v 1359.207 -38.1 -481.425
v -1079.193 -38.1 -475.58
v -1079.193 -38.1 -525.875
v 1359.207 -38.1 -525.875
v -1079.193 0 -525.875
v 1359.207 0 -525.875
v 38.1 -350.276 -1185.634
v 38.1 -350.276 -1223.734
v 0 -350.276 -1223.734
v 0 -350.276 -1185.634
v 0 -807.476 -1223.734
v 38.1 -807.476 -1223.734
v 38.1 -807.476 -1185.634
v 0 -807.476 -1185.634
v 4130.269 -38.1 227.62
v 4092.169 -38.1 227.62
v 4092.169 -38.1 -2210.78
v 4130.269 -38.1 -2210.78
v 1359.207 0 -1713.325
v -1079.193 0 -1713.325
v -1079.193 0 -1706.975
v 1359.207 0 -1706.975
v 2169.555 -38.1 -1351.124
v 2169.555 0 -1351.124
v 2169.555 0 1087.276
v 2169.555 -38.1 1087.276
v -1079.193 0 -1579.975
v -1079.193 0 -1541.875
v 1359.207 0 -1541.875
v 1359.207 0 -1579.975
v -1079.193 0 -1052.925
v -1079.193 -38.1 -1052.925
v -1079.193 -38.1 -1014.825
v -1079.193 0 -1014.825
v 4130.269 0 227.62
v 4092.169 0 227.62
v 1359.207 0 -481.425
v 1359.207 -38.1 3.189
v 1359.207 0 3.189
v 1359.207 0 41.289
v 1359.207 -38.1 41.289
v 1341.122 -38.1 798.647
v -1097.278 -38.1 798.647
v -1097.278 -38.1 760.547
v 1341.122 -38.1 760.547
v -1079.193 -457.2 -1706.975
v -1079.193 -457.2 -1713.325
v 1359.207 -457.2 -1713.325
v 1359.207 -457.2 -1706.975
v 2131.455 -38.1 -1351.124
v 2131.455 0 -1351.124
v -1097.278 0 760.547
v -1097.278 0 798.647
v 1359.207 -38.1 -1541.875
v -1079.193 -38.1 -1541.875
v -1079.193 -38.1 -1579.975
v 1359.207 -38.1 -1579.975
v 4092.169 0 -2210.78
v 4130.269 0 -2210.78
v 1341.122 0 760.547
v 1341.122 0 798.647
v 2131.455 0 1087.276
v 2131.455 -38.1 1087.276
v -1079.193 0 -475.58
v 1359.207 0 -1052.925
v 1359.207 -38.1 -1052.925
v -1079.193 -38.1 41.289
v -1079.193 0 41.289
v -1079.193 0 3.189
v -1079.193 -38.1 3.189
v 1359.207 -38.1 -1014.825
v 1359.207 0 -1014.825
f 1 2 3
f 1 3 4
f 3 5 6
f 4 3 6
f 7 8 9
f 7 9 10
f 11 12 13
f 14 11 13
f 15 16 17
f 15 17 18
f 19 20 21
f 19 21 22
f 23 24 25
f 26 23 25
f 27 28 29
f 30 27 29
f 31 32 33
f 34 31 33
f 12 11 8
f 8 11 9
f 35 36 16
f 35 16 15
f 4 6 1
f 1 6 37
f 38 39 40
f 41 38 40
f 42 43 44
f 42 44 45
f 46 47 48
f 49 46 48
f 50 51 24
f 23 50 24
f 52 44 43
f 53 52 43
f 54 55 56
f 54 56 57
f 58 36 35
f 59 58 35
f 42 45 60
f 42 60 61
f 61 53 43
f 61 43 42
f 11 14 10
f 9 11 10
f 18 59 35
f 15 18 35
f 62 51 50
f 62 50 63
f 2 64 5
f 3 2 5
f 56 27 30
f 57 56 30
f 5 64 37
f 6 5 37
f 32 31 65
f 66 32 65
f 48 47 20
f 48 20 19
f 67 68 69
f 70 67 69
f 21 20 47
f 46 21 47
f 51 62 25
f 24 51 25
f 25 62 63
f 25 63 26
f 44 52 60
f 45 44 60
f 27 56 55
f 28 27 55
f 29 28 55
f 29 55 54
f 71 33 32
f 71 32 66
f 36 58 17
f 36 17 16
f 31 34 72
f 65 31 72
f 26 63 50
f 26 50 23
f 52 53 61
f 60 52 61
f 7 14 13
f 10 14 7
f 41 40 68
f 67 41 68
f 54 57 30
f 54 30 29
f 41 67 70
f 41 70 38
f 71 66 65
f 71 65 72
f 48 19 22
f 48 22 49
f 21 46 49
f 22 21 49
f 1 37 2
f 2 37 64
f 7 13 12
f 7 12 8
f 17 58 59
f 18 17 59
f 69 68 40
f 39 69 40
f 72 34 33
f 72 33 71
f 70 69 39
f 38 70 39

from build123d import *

# Parameters (mm, degrees)
F0_W      = 2438.4
F0_H      = 38.1
F1_DEPTH  = 38.1
F0_W_2    = 38.1
F0_H_2    = 2438.4
F2_DEPTH  = 38.1
F3_DEPTH  = 38.1
F4_DEPTH  = 38.1
F5_DEPTH  = 38.1
F6_DEPTH  = 38.1
F7_E6_W   = 2438.4
F7_E6_H   = 457.2
F8_DEPTH  = 6.35
F9_DEPTH  = 38.1
F10_W     = 457.2
F10_H     = 38.1
F11_DEPTH = 38.1


with BuildPart() as f1:
    # F0 (on Front) → F1 (new body)
    with BuildSketch(Plane.XZ):
        with Locations((121.9220010757, 779.5966842651)):
            Rectangle(F0_W, F0_H)
    extrude(amount=F1_DEPTH)


with BuildPart() as f2:
    # F0 (on Front) → F2 (new body)
    with BuildSketch(Plane.XZ):
        with Locations((2150.5049446106, -131.9238098145)):
            Rectangle(F0_W_2, F0_H_2)
    extrude(amount=F2_DEPTH)


with BuildPart() as f3:
    # F0 (on Front) → F3 (new body)
    with BuildSketch(Plane.XZ):
        with Locations((140.006583941, -1560.925090957)):
            Rectangle(F0_W, F0_H)
    extrude(amount=F3_DEPTH)


with BuildPart() as f4:
    # F0 (on Front) → F4 (new body)
    with BuildSketch(Plane.XZ):
        with Locations((140.006583941, -1033.875090957)):
            Rectangle(F0_W, F0_H)
    extrude(amount=F4_DEPTH)


with BuildPart() as f5:
    # F0 (on Front) → F5 (new body)
    with BuildSketch(Plane.XZ):
        Polygon((1359.206583941, 7.0199789283), (1359.206583941, 41.2889796493), (-1079.193416059, 41.2889796493), (-1079.193416059, 13.3699789283), (-1079.193416059, 3.1889796493), (1359.206583941, 3.1889796493), align=None)
    extrude(amount=F5_DEPTH)


with BuildPart() as f6:
    # F0 (on Front) → F6 (new body)
    with BuildSketch(Plane.XZ):
        Polygon((1359.206583941, -525.875090957), (1359.206583941, -481.425090957), (-1079.193416059, -475.5800210717), (-1079.193416059, -525.875090957), align=None)
    extrude(amount=F6_DEPTH)


with BuildPart() as f8:
    # F7_E6 (on explicit) → F8 (new body)
    with BuildSketch(Plane(origin=(-1079.193416059, 0, -1713.325090957), x_dir=(1, 0, 0), z_dir=(0, 0, -1))):
        with Locations((1219.2, 228.6)):
            Rectangle(F7_E6_W, F7_E6_H)
    extrude(amount=-F8_DEPTH)


with BuildPart() as f9:
    # F0 (on Front) → F9 (new body)
    with BuildSketch(Plane.XZ):
        with Locations((4111.2189292908, -991.5800094604)):
            Rectangle(F0_W_2, F0_H_2)
    extrude(amount=F9_DEPTH)


with BuildPart() as f11:
    # F10 (on Right) → F11 (new body)
    with BuildSketch(Plane.YZ):
        with Locations((-578.8760185242, -1204.6841109155)):
            Rectangle(F10_W, F10_H)
    extrude(amount=F11_DEPTH)


solid = Compound([f1.part, f2.part, f3.part, f4.part, f5.part, f6.part, f8.part, f9.part, f11.part])
